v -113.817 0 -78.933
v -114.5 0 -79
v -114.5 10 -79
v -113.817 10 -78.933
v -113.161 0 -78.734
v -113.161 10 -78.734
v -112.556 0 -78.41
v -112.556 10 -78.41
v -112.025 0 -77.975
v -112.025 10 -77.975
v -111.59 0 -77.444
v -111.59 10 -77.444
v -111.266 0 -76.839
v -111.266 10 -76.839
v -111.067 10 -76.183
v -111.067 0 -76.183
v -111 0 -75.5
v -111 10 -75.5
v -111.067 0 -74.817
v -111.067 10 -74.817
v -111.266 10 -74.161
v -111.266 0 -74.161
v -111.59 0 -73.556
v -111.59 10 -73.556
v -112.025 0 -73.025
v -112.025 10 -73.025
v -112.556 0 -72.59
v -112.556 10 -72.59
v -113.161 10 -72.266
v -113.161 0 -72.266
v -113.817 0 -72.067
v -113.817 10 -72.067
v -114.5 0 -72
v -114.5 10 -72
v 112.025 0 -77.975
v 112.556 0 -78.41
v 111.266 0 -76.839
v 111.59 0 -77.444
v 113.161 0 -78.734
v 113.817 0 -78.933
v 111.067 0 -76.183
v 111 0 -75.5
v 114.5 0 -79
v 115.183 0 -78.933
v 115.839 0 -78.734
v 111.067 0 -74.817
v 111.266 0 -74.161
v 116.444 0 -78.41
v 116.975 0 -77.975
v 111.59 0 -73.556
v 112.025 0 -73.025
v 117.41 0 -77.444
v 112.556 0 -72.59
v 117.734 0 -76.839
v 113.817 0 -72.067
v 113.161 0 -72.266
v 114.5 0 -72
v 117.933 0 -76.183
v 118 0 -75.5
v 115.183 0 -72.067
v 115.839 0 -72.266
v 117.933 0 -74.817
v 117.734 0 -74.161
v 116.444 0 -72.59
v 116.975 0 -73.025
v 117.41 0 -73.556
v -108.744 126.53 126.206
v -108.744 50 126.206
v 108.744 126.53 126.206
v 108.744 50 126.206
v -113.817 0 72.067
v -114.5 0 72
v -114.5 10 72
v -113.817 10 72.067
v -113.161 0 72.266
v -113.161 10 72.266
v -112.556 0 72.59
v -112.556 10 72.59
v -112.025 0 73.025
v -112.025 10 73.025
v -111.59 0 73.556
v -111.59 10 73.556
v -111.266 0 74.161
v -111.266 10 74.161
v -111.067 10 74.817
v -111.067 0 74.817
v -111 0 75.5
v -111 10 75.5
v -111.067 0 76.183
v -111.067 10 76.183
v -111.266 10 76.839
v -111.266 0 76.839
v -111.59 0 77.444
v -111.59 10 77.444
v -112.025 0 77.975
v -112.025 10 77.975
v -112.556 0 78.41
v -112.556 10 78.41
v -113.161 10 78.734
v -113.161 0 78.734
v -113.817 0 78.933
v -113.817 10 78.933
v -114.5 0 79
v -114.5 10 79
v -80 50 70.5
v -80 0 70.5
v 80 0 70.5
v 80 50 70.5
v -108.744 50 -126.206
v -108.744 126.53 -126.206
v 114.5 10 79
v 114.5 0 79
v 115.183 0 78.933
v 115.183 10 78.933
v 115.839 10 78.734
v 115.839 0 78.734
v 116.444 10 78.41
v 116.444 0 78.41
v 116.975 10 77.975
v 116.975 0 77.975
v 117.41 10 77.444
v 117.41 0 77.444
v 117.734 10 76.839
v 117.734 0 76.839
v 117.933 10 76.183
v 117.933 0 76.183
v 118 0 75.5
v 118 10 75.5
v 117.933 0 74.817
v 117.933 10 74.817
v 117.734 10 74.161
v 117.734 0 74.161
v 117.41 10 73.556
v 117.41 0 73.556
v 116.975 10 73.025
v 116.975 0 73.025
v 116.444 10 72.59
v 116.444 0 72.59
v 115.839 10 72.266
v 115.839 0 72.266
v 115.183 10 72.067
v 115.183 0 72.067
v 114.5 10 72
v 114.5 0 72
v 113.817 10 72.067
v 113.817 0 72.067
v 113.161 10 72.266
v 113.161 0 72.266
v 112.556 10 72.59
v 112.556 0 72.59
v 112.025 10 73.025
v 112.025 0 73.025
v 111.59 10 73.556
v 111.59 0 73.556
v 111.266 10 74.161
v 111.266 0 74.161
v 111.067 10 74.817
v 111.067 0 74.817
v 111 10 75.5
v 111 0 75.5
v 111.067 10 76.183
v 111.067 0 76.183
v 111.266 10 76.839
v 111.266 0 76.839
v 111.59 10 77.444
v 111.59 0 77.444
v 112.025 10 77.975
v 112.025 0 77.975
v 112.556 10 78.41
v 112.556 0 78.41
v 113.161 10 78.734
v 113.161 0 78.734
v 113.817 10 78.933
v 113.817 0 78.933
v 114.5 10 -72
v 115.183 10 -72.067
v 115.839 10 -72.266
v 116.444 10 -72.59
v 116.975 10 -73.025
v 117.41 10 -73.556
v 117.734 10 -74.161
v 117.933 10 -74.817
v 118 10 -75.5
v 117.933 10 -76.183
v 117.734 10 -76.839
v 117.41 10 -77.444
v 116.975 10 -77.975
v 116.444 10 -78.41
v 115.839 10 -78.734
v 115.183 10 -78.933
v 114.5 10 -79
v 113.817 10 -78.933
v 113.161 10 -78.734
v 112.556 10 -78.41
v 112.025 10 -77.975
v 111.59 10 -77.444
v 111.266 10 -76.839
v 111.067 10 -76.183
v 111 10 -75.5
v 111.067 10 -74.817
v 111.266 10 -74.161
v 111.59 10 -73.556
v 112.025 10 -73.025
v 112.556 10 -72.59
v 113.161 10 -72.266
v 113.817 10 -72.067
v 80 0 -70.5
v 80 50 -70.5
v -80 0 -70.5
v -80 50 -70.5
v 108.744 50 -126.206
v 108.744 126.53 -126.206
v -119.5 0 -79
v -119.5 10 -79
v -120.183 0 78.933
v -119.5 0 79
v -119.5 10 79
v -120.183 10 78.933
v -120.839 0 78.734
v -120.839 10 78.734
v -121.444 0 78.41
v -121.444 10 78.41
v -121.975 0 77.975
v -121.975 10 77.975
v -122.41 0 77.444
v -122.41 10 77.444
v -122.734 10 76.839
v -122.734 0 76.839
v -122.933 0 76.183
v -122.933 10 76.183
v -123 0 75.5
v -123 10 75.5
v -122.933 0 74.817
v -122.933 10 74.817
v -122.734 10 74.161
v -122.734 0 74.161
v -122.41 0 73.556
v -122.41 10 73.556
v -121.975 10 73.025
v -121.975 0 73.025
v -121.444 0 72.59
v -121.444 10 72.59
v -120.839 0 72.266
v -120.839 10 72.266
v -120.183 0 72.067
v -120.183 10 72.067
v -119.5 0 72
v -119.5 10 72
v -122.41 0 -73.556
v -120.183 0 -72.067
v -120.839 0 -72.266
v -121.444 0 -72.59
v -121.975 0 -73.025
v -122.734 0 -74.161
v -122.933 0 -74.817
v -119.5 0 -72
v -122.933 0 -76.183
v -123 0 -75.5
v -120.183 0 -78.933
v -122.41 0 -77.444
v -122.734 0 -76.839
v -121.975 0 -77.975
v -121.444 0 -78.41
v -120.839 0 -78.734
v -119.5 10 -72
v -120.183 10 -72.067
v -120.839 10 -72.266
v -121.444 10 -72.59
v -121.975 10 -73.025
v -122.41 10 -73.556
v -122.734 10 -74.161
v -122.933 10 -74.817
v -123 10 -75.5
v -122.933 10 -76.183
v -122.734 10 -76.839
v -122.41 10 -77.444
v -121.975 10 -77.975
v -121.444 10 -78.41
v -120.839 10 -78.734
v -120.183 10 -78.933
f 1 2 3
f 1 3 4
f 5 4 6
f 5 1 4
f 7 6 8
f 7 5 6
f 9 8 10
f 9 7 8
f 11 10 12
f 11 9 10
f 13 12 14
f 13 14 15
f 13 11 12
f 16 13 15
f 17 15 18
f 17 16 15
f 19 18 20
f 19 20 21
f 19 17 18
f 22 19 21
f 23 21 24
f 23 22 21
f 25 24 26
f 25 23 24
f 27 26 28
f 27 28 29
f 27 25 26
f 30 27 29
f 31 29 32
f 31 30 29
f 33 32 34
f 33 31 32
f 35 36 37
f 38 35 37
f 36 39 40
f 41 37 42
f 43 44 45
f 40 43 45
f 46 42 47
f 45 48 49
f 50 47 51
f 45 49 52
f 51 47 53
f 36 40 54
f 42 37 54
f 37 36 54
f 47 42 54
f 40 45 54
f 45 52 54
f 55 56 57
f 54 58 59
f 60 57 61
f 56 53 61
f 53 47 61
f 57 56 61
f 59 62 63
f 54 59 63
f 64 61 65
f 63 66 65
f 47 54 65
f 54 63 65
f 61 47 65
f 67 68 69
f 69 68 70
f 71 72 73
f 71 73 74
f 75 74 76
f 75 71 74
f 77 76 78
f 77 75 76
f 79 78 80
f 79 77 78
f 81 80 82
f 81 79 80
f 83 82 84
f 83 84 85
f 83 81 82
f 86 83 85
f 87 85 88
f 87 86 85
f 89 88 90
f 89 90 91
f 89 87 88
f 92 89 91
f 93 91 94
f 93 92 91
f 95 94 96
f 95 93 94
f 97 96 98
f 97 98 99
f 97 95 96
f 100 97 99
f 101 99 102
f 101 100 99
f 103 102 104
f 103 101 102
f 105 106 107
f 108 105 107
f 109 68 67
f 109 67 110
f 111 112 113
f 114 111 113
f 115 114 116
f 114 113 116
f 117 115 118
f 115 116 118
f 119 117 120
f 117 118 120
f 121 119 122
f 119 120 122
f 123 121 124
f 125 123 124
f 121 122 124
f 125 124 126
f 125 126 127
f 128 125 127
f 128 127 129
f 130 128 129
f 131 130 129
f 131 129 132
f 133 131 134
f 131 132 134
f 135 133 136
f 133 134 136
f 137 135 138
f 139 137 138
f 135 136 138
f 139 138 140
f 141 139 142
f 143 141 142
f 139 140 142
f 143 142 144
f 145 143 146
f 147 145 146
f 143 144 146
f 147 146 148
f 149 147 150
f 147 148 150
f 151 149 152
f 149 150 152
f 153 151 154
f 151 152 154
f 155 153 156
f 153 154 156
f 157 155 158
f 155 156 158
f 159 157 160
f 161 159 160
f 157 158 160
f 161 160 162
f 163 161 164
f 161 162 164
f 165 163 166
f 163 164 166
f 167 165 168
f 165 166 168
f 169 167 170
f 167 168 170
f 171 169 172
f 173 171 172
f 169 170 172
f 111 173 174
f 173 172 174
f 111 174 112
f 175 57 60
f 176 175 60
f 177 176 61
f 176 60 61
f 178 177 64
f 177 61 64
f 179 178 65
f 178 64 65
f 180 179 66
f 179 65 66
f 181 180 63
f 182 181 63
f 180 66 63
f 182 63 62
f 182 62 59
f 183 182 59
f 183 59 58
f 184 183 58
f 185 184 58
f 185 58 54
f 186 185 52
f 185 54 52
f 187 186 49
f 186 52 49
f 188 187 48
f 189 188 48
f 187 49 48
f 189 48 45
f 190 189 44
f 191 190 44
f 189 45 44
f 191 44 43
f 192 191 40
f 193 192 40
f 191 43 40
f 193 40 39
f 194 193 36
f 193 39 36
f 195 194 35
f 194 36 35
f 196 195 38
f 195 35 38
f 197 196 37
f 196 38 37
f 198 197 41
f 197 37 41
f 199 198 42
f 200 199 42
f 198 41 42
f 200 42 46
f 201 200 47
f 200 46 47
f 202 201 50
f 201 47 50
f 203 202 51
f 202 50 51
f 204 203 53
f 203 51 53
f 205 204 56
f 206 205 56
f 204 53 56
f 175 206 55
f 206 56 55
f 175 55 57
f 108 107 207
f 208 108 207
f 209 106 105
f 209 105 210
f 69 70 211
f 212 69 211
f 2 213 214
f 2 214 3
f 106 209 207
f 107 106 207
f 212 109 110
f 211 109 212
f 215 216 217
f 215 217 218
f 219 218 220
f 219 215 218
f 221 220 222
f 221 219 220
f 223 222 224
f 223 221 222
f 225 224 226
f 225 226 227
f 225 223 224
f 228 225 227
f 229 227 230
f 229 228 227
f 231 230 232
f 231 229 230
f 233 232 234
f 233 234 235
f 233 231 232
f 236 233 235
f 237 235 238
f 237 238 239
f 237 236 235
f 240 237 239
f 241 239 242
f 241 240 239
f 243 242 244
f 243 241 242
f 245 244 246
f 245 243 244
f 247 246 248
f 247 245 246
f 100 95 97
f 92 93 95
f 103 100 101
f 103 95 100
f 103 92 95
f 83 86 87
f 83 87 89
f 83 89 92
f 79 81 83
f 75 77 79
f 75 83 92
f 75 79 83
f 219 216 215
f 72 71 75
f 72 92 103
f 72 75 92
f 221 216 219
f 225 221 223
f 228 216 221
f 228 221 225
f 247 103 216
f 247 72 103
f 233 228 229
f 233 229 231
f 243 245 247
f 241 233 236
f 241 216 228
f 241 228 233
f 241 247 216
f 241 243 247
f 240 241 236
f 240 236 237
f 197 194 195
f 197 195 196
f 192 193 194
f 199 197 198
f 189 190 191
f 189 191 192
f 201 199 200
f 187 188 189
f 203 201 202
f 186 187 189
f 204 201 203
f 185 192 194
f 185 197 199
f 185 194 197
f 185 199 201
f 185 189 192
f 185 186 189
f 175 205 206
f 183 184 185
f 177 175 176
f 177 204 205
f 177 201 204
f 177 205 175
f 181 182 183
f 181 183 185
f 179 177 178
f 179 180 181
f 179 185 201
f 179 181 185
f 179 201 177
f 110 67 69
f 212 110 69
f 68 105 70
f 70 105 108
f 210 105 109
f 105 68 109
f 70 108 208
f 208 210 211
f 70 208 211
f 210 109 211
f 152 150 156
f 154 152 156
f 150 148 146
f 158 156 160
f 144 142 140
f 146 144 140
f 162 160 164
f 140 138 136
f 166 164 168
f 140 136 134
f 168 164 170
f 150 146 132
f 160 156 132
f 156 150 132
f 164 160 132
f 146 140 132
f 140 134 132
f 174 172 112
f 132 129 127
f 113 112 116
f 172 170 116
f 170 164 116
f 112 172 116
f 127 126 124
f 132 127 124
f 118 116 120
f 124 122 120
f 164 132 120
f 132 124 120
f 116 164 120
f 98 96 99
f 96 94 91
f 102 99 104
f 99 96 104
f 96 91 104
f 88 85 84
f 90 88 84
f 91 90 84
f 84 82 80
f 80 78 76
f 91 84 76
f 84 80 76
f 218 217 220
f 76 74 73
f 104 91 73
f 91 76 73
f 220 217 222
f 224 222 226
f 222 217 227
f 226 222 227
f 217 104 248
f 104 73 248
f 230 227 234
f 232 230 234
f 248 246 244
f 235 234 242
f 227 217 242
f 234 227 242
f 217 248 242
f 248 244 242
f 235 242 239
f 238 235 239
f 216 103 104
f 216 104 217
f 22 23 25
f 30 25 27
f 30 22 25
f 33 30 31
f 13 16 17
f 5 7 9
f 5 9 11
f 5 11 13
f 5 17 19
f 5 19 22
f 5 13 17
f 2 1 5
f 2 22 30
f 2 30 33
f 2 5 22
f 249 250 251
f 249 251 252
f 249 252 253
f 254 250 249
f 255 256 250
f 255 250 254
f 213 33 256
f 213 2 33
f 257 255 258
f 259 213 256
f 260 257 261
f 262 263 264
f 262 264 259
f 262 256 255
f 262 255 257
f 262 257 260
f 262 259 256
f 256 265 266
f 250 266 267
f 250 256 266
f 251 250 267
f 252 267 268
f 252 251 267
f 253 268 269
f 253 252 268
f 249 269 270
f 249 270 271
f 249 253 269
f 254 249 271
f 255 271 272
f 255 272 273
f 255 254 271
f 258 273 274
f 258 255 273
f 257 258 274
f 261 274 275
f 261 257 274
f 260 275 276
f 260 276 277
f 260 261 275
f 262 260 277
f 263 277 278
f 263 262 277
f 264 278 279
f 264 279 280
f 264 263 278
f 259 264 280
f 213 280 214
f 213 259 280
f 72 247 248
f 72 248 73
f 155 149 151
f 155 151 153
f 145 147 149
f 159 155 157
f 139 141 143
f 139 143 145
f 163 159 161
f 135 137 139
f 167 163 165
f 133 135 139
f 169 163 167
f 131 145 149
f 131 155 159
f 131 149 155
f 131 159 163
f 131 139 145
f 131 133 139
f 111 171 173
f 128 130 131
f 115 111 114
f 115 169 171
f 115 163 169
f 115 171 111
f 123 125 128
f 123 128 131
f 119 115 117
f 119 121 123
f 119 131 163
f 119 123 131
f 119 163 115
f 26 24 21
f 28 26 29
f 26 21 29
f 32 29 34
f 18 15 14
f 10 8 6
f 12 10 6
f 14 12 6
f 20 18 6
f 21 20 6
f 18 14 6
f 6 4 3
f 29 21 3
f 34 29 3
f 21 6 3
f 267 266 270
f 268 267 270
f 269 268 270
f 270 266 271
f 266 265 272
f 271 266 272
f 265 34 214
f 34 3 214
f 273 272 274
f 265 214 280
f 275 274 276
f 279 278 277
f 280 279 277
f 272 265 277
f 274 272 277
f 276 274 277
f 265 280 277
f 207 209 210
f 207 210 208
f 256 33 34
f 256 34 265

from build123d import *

# Parameters (mm, degrees)
SKETCH1_W             = 160
SKETCH1_H             = 141
BOSS_EXTRUDE1_DEPTH   = 50
BOSS_EXTRUDE2_START   = 50
SKETCH1_3_W           = 217.4875
SKETCH1_3_H           = 252.4125
BOSS_EXTRUDE2_DEPTH   = 76.5302
BOSS_EXTRUDE3_DEPTH   = 10
BOSS_EXTRUDE3_2_DEPTH = 10
SKETCH1_4_R           = 3.5
BOSS_EXTRUDE3_3_DEPTH = 10
BOSS_EXTRUDE3_4_DEPTH = 10


with BuildPart() as part:
    # Sketch1 → Boss-Extrude1 (new body)
    with BuildSketch(Plane(origin=(0, 0, 0), x_dir=(1, 0, 0), z_dir=(0, 1, 0))):
        Rectangle(SKETCH1_W, SKETCH1_H)
    extrude(amount=BOSS_EXTRUDE1_DEPTH)

    # Sketch1<3> → Boss-Extrude2 (add)
    with BuildSketch(Plane(origin=(0, 0, 0), x_dir=(1, 0, 0), z_dir=(0, 1, 0)).offset(BOSS_EXTRUDE2_START)):
        Rectangle(SKETCH1_3_W, SKETCH1_3_H)
    extrude(amount=BOSS_EXTRUDE2_DEPTH)


with BuildPart() as body_2:
    # Sketch1<4> → Boss-Extrude3 (new body)
    with BuildSketch(Plane(origin=(0, 0, 0), x_dir=(1, 0, 0), z_dir=(0, 1, 0))):
        with BuildLine():
            ThreePointArc((-114.5, 79), (-111, 75.5), (-114.5, 72))
            Line((-114.5, 72), (-119.5, 72))
            ThreePointArc((-119.5, 72), (-122.999998138, 75.5), (-119.5, 79))
            Line((-119.5, 79), (-114.5, 79))
        make_face()
    extrude(amount=BOSS_EXTRUDE3_DEPTH)


with BuildPart() as body_3:
    # Sketch1<4> → Boss-Extrude3 2 (new body)
    with BuildSketch(Plane(origin=(0, 0, 0), x_dir=(1, 0, 0), z_dir=(0, 1, 0))):
        with BuildLine():
            ThreePointArc((-114.499999164, -72), (-110.999999164, -75.5), (-114.499999164, -79))
            Line((-114.499999164, -79), (-119.499999164, -79))
            ThreePointArc((-119.499999164, -79), (-122.999998974, -75.5), (-119.499999164, -72))
            Line((-119.499999164, -72), (-114.499999164, -72))
        make_face()
    extrude(amount=BOSS_EXTRUDE3_2_DEPTH)


with BuildPart() as body_4:
    # Sketch1<4> → Boss-Extrude3 3 (new body)
    with BuildSketch(Plane(origin=(0, 0, 0), x_dir=(1, 0, 0), z_dir=(0, 1, 0))):
        with Locations(Location((114.5, -75.5, 0), (0, 0, 270))):
            Circle(SKETCH1_4_R)
    extrude(amount=BOSS_EXTRUDE3_3_DEPTH)


with BuildPart() as body_5:
    # Sketch1<4> → Boss-Extrude3 4 (new body)
    with BuildSketch(Plane(origin=(0, 0, 0), x_dir=(1, 0, 0), z_dir=(0, 1, 0))):
        with Locations(Location((114.5, 75.5, 0), (0, 0, 270))):
            Circle(SKETCH1_4_R)
    extrude(amount=BOSS_EXTRUDE3_4_DEPTH)


solid = Compound([part.part, body_2.part, body_3.part, body_4.part, body_5.part])
